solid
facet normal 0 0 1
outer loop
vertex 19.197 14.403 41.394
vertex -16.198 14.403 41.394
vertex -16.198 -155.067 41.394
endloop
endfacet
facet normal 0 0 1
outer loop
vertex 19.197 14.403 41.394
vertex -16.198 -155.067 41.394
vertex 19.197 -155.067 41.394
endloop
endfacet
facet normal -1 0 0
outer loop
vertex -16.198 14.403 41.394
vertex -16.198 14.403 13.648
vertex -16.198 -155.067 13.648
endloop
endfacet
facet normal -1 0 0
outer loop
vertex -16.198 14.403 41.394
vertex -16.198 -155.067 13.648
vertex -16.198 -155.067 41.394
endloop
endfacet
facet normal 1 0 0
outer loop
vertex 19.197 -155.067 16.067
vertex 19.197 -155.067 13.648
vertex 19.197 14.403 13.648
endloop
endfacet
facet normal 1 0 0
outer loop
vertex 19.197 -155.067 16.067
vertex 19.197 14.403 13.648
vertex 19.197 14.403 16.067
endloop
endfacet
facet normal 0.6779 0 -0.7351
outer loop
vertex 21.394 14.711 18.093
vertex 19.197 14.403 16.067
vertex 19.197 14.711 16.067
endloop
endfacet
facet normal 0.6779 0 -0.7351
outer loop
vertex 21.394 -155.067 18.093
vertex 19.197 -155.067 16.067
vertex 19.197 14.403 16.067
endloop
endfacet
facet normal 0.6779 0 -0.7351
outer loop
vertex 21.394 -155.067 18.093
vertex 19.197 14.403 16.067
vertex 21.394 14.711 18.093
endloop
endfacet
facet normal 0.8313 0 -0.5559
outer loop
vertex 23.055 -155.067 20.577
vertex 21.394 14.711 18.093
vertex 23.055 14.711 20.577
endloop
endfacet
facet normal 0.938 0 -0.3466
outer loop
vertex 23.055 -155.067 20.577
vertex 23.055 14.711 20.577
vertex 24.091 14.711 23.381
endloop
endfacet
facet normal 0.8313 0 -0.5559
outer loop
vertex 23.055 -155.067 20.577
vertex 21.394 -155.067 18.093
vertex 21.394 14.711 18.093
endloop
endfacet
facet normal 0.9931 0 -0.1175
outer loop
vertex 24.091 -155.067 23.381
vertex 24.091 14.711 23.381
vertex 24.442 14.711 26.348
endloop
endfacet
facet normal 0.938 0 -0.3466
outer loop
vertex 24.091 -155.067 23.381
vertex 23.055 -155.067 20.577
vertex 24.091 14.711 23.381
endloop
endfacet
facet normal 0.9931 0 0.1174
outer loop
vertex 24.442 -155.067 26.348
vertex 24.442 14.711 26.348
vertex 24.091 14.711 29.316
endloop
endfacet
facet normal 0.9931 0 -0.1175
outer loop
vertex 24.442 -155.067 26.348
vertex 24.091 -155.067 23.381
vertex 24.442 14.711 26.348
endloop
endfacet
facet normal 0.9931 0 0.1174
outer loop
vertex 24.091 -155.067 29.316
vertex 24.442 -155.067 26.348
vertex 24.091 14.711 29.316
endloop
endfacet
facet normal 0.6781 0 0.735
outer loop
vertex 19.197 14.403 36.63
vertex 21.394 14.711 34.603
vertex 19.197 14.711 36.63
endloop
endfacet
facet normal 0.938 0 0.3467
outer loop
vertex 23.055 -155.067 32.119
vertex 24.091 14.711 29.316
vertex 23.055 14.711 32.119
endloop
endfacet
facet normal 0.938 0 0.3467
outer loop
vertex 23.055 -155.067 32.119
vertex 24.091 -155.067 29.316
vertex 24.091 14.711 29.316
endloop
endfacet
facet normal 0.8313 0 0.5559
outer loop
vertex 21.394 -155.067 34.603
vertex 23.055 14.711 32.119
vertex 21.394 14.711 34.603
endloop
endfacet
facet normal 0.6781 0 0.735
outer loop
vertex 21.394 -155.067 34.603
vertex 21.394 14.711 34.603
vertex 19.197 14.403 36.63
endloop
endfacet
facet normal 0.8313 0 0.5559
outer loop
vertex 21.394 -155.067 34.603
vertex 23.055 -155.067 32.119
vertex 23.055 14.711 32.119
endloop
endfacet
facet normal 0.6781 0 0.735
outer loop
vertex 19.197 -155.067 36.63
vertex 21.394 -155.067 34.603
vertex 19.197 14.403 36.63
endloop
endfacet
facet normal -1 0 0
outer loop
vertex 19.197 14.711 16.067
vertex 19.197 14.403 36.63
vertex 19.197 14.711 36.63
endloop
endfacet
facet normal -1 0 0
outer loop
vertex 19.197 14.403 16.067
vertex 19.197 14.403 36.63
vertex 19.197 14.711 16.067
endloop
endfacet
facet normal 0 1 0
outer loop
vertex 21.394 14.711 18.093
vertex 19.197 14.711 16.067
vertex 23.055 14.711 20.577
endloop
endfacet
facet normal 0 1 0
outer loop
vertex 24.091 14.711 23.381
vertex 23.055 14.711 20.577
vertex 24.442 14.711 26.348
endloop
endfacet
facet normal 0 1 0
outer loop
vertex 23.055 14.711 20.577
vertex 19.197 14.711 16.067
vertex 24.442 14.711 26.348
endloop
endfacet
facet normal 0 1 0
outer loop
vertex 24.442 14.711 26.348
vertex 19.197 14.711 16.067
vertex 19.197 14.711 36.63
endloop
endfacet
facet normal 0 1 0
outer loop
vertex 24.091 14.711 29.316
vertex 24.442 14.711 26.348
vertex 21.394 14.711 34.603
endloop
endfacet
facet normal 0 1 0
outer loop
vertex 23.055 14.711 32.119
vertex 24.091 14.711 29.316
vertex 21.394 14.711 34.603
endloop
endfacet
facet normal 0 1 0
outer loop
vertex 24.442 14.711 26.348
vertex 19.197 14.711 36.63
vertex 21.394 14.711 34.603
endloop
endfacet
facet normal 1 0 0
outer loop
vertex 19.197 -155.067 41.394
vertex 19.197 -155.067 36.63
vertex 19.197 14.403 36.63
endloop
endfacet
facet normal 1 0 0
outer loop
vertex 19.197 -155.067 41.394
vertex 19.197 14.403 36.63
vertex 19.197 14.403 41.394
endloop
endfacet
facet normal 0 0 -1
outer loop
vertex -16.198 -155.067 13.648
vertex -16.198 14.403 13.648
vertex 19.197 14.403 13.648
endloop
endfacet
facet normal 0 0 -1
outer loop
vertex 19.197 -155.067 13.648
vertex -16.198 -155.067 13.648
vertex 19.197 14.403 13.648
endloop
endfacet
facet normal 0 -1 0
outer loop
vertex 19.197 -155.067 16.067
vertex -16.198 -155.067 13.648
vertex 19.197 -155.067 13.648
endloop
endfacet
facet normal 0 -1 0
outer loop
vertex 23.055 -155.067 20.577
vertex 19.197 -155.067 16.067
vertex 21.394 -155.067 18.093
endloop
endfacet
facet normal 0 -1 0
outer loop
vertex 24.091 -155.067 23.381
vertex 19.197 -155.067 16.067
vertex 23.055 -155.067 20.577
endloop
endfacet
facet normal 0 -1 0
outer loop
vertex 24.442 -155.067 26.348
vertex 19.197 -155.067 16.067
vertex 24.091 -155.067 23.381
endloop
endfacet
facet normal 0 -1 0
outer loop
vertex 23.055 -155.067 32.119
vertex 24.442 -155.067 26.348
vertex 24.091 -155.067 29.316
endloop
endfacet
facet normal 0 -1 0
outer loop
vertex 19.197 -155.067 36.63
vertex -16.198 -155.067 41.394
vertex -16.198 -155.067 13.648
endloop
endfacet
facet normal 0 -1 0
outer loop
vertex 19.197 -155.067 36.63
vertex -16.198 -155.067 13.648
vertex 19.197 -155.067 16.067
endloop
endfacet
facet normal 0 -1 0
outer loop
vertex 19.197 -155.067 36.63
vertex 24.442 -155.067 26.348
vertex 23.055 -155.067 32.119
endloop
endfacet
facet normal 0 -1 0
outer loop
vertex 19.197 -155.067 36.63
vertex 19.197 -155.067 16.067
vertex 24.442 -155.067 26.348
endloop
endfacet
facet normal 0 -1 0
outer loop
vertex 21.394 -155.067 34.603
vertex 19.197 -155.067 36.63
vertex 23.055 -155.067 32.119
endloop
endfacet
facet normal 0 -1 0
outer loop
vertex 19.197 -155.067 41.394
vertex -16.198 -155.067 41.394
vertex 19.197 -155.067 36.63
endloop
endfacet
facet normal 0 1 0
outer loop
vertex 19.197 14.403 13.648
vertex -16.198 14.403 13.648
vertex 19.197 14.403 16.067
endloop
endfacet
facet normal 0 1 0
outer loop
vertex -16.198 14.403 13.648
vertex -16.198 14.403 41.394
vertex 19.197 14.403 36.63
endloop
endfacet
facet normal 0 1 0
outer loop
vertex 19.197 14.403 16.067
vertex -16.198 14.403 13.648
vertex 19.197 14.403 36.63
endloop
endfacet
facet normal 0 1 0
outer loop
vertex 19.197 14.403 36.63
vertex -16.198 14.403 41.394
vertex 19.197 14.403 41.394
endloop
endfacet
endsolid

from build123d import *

# Parameters (mm, degrees)
F0_W     = 35.3952348232
F0_H     = 27.7462676167
F1_DEPTH = 155.0669968128
F3_DEPTH = 155.3752869368
F4_DEPTH = 14.4026782364


with BuildPart() as f1:
    # F0 (on Front) → F1 (new body)
    with BuildSketch(Plane.XZ):
        with Locations((1.4998167753, 27.5213085115)):
            Rectangle(F0_W, F0_H)
    extrude(amount=F1_DEPTH)

    # F2 (on face) → F3 (join)
    with BuildSketch(Plane.XZ.offset(155.0669968128)):
        with BuildLine():
            ThreePointArc((19.1974341869, 16.066663446), (23.0552776861, 20.5771904827), (24.4421993637, 26.3481747031))
            ThreePointArc((24.4421993637, 26.3481747031), (23.0552776861, 32.1191589236), (19.1974341869, 36.6296859603))
            Line((19.1974341869, 36.6296859603), (19.1974341869, 16.066663446))
        make_face()
    extrude(amount=-F3_DEPTH)

    # F4 (add): faces of the model
    f4_faces = [f1.faces().sort_by_distance(p)[0] for p in [
        (1.4998167753, 0, 27.5213085115),
        (21.3375597344, 0.3082901239, 26.3481747031),
    ]]
    extrude(f4_faces, amount=F4_DEPTH)


solid = f1.part
